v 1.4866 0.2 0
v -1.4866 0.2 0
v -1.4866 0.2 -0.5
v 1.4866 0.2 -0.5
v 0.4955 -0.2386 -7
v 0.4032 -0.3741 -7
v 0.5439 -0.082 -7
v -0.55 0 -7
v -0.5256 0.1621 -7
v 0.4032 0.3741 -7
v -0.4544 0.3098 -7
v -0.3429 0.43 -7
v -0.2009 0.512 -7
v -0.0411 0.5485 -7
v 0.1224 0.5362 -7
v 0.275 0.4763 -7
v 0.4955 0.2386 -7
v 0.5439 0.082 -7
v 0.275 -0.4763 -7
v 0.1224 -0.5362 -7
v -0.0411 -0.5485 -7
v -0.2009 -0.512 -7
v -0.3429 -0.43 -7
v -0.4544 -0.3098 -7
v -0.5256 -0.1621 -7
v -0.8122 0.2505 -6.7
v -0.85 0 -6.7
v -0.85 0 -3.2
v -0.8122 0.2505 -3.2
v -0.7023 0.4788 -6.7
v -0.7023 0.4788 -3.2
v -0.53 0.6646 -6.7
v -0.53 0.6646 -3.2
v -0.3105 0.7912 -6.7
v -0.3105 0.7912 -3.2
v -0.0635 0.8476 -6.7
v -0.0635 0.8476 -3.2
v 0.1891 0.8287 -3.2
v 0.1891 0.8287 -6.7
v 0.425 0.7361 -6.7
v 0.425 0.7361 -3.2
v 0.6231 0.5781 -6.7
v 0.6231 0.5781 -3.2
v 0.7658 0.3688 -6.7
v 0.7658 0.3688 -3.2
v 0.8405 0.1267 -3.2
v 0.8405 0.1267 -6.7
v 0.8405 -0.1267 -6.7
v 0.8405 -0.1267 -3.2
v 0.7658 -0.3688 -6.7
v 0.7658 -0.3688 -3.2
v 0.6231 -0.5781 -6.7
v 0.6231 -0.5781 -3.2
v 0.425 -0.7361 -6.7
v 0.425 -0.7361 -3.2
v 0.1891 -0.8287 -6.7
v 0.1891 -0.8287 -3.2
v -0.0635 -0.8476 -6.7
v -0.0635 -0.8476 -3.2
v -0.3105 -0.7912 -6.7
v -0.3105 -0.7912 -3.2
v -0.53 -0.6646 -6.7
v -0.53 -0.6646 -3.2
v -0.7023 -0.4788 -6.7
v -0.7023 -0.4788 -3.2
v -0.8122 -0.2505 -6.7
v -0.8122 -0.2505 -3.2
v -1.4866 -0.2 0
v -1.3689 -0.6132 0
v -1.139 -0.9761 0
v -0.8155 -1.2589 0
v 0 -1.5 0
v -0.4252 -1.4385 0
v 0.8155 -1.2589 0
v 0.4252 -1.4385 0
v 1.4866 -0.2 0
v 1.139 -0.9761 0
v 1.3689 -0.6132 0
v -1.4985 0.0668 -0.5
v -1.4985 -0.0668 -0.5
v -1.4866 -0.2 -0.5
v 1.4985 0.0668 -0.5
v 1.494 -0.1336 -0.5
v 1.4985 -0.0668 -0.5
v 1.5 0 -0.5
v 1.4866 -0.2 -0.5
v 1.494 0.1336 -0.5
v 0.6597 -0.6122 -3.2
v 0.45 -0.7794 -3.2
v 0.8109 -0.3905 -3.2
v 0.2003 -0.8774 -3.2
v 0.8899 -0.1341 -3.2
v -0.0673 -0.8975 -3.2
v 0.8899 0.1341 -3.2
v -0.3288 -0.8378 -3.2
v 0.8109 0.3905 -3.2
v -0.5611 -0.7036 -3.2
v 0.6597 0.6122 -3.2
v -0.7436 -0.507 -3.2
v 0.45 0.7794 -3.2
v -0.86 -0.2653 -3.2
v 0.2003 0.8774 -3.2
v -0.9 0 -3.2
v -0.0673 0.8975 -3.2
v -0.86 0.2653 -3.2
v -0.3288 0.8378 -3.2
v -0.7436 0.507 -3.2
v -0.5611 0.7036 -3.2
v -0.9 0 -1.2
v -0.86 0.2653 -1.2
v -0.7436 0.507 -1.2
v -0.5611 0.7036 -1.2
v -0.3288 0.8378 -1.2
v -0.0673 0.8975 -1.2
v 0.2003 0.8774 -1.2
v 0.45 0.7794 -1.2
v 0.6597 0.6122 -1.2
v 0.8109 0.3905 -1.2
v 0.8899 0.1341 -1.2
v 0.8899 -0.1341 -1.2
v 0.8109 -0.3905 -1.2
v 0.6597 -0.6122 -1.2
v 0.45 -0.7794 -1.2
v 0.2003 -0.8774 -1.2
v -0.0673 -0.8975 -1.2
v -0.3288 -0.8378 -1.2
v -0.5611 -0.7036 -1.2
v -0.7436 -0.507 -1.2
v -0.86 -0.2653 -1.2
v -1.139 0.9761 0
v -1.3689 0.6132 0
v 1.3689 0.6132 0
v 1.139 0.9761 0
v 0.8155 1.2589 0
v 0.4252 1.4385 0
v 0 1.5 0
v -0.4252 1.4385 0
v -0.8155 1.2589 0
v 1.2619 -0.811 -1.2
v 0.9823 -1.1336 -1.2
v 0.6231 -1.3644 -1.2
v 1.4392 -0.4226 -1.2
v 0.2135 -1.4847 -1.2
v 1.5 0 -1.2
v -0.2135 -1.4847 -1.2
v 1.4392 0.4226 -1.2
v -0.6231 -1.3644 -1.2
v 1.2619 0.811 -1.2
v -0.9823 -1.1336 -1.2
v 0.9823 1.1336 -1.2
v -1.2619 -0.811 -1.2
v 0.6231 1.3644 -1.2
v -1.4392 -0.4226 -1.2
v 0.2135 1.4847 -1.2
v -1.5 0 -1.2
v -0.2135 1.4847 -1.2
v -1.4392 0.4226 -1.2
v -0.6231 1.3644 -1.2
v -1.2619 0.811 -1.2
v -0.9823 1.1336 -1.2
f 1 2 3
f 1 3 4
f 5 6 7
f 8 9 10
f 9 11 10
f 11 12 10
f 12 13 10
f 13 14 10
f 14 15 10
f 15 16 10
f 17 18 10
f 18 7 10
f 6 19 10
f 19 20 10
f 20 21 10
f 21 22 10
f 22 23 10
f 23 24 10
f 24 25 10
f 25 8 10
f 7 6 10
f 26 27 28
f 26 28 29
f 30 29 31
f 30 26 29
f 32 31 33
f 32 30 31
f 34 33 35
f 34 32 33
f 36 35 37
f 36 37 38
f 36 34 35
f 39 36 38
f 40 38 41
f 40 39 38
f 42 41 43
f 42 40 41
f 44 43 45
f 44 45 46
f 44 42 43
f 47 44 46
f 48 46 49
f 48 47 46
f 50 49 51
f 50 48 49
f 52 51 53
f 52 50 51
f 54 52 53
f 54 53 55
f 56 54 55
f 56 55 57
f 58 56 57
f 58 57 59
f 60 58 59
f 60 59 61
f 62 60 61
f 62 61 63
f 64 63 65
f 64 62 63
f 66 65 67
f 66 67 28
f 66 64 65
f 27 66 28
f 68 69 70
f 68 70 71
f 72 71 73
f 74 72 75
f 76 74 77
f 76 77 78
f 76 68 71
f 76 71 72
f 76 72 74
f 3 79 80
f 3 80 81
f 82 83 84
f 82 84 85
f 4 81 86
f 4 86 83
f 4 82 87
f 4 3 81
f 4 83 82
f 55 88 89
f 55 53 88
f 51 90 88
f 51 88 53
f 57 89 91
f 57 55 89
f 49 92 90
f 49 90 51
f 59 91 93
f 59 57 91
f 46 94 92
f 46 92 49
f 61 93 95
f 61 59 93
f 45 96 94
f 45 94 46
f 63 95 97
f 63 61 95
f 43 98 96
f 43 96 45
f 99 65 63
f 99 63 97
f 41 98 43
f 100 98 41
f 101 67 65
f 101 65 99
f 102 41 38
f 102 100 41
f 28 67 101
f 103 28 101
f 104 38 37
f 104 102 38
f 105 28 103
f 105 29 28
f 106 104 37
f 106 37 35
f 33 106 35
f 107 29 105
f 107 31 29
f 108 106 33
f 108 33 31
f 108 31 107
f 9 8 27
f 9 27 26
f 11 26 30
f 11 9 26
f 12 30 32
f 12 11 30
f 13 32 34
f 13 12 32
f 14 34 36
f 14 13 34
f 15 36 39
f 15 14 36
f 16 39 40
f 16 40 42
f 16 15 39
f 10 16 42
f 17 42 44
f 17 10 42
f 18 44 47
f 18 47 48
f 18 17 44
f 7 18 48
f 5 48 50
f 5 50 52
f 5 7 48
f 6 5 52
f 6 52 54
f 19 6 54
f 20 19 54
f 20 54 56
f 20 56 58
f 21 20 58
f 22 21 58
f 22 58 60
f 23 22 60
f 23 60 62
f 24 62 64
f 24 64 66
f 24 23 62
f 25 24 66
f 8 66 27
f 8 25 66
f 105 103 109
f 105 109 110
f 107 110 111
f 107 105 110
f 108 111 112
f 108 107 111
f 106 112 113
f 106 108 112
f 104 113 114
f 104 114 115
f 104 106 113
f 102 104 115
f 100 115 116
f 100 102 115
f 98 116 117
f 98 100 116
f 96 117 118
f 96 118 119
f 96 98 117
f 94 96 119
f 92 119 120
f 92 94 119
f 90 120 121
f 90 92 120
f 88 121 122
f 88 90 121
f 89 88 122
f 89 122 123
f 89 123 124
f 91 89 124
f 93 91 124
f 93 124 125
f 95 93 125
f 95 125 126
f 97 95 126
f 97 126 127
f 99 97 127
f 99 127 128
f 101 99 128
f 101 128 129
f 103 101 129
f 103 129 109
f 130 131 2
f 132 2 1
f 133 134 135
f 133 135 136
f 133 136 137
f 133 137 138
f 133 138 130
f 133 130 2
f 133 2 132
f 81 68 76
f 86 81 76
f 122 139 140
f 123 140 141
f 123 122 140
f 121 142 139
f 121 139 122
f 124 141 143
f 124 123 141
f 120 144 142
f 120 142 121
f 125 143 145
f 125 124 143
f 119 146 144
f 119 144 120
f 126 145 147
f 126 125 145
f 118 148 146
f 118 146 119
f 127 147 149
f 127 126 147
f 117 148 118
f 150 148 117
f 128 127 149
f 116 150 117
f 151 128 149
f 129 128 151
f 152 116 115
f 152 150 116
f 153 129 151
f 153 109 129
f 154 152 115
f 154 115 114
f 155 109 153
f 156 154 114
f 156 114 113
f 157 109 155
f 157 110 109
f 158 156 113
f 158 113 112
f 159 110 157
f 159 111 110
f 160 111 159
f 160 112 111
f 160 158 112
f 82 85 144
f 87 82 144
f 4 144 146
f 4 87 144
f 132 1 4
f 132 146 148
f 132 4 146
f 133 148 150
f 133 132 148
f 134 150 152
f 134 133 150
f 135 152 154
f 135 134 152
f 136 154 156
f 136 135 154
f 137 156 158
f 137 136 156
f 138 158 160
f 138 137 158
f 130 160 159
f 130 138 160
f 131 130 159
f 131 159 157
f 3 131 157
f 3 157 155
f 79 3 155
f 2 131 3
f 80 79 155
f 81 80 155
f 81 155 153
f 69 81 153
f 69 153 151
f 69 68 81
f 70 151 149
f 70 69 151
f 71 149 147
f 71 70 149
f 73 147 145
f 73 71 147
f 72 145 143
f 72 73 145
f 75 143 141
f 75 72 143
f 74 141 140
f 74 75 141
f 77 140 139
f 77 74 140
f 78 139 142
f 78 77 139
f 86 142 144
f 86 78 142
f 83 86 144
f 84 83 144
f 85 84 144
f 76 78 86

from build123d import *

# Parameters (mm, degrees)
SKETCH2_R           = 1.5
BOSS_EXTRUDE1_DEPTH = 7
SKETCH4_OUTSIDE_W   = 6.638
SKETCH4_OUTSIDE_H   = 6.638
SKETCH4_OUTSIDE_R   = 0.9
CUT_EXTRUDE1_DEPTH  = 5.8
SKETCH5_OUTSIDE_W   = 6.638
SKETCH5_OUTSIDE_H   = 6.638
SKETCH5_OUTSIDE_R   = 0.85
CUT_EXTRUDE2_DEPTH  = 3.8
SKETCH6_W           = 3.2
SKETCH6_H           = 0.4
CUT_EXTRUDE3_DEPTH  = 0.5
CHAMFER1_SIZE       = 0.3


with BuildPart() as part:
    # Sketch2 → Boss-Extrude1 (new body)
    with BuildSketch(Plane.XY):
        Circle(SKETCH2_R)
    extrude(amount=-BOSS_EXTRUDE1_DEPTH)

    # Sketch4 outside → Cut-Extrude1 (cut)
    with BuildSketch(Plane(origin=(0, 0, -7), x_dir=(-1, 0, 0), z_dir=(0, 0, -1))):
        Rectangle(SKETCH4_OUTSIDE_W, SKETCH4_OUTSIDE_H)
        Circle(SKETCH4_OUTSIDE_R, mode=Mode.SUBTRACT)
    extrude(amount=-CUT_EXTRUDE1_DEPTH, mode=Mode.SUBTRACT)

    # Sketch5 outside → Cut-Extrude2 (cut)
    with BuildSketch(Plane(origin=(0, 0, -7), x_dir=(-1, 0, 0), z_dir=(0, 0, -1))):
        Rectangle(SKETCH5_OUTSIDE_W, SKETCH5_OUTSIDE_H)
        Circle(SKETCH5_OUTSIDE_R, mode=Mode.SUBTRACT)
    extrude(amount=-CUT_EXTRUDE2_DEPTH, mode=Mode.SUBTRACT)

    # Sketch6 → Cut-Extrude3 (cut)
    with BuildSketch(Plane.XY):
        Rectangle(SKETCH6_W, SKETCH6_H)
    extrude(amount=-CUT_EXTRUDE3_DEPTH, mode=Mode.SUBTRACT)

    # Chamfer1
    chamfer1_edges = [part.edges().sort_by_distance(p)[0] for p in [
        (0.85, 0, -7),
    ]]
    chamfer(chamfer1_edges, length=CHAMFER1_SIZE)


solid = part.part
